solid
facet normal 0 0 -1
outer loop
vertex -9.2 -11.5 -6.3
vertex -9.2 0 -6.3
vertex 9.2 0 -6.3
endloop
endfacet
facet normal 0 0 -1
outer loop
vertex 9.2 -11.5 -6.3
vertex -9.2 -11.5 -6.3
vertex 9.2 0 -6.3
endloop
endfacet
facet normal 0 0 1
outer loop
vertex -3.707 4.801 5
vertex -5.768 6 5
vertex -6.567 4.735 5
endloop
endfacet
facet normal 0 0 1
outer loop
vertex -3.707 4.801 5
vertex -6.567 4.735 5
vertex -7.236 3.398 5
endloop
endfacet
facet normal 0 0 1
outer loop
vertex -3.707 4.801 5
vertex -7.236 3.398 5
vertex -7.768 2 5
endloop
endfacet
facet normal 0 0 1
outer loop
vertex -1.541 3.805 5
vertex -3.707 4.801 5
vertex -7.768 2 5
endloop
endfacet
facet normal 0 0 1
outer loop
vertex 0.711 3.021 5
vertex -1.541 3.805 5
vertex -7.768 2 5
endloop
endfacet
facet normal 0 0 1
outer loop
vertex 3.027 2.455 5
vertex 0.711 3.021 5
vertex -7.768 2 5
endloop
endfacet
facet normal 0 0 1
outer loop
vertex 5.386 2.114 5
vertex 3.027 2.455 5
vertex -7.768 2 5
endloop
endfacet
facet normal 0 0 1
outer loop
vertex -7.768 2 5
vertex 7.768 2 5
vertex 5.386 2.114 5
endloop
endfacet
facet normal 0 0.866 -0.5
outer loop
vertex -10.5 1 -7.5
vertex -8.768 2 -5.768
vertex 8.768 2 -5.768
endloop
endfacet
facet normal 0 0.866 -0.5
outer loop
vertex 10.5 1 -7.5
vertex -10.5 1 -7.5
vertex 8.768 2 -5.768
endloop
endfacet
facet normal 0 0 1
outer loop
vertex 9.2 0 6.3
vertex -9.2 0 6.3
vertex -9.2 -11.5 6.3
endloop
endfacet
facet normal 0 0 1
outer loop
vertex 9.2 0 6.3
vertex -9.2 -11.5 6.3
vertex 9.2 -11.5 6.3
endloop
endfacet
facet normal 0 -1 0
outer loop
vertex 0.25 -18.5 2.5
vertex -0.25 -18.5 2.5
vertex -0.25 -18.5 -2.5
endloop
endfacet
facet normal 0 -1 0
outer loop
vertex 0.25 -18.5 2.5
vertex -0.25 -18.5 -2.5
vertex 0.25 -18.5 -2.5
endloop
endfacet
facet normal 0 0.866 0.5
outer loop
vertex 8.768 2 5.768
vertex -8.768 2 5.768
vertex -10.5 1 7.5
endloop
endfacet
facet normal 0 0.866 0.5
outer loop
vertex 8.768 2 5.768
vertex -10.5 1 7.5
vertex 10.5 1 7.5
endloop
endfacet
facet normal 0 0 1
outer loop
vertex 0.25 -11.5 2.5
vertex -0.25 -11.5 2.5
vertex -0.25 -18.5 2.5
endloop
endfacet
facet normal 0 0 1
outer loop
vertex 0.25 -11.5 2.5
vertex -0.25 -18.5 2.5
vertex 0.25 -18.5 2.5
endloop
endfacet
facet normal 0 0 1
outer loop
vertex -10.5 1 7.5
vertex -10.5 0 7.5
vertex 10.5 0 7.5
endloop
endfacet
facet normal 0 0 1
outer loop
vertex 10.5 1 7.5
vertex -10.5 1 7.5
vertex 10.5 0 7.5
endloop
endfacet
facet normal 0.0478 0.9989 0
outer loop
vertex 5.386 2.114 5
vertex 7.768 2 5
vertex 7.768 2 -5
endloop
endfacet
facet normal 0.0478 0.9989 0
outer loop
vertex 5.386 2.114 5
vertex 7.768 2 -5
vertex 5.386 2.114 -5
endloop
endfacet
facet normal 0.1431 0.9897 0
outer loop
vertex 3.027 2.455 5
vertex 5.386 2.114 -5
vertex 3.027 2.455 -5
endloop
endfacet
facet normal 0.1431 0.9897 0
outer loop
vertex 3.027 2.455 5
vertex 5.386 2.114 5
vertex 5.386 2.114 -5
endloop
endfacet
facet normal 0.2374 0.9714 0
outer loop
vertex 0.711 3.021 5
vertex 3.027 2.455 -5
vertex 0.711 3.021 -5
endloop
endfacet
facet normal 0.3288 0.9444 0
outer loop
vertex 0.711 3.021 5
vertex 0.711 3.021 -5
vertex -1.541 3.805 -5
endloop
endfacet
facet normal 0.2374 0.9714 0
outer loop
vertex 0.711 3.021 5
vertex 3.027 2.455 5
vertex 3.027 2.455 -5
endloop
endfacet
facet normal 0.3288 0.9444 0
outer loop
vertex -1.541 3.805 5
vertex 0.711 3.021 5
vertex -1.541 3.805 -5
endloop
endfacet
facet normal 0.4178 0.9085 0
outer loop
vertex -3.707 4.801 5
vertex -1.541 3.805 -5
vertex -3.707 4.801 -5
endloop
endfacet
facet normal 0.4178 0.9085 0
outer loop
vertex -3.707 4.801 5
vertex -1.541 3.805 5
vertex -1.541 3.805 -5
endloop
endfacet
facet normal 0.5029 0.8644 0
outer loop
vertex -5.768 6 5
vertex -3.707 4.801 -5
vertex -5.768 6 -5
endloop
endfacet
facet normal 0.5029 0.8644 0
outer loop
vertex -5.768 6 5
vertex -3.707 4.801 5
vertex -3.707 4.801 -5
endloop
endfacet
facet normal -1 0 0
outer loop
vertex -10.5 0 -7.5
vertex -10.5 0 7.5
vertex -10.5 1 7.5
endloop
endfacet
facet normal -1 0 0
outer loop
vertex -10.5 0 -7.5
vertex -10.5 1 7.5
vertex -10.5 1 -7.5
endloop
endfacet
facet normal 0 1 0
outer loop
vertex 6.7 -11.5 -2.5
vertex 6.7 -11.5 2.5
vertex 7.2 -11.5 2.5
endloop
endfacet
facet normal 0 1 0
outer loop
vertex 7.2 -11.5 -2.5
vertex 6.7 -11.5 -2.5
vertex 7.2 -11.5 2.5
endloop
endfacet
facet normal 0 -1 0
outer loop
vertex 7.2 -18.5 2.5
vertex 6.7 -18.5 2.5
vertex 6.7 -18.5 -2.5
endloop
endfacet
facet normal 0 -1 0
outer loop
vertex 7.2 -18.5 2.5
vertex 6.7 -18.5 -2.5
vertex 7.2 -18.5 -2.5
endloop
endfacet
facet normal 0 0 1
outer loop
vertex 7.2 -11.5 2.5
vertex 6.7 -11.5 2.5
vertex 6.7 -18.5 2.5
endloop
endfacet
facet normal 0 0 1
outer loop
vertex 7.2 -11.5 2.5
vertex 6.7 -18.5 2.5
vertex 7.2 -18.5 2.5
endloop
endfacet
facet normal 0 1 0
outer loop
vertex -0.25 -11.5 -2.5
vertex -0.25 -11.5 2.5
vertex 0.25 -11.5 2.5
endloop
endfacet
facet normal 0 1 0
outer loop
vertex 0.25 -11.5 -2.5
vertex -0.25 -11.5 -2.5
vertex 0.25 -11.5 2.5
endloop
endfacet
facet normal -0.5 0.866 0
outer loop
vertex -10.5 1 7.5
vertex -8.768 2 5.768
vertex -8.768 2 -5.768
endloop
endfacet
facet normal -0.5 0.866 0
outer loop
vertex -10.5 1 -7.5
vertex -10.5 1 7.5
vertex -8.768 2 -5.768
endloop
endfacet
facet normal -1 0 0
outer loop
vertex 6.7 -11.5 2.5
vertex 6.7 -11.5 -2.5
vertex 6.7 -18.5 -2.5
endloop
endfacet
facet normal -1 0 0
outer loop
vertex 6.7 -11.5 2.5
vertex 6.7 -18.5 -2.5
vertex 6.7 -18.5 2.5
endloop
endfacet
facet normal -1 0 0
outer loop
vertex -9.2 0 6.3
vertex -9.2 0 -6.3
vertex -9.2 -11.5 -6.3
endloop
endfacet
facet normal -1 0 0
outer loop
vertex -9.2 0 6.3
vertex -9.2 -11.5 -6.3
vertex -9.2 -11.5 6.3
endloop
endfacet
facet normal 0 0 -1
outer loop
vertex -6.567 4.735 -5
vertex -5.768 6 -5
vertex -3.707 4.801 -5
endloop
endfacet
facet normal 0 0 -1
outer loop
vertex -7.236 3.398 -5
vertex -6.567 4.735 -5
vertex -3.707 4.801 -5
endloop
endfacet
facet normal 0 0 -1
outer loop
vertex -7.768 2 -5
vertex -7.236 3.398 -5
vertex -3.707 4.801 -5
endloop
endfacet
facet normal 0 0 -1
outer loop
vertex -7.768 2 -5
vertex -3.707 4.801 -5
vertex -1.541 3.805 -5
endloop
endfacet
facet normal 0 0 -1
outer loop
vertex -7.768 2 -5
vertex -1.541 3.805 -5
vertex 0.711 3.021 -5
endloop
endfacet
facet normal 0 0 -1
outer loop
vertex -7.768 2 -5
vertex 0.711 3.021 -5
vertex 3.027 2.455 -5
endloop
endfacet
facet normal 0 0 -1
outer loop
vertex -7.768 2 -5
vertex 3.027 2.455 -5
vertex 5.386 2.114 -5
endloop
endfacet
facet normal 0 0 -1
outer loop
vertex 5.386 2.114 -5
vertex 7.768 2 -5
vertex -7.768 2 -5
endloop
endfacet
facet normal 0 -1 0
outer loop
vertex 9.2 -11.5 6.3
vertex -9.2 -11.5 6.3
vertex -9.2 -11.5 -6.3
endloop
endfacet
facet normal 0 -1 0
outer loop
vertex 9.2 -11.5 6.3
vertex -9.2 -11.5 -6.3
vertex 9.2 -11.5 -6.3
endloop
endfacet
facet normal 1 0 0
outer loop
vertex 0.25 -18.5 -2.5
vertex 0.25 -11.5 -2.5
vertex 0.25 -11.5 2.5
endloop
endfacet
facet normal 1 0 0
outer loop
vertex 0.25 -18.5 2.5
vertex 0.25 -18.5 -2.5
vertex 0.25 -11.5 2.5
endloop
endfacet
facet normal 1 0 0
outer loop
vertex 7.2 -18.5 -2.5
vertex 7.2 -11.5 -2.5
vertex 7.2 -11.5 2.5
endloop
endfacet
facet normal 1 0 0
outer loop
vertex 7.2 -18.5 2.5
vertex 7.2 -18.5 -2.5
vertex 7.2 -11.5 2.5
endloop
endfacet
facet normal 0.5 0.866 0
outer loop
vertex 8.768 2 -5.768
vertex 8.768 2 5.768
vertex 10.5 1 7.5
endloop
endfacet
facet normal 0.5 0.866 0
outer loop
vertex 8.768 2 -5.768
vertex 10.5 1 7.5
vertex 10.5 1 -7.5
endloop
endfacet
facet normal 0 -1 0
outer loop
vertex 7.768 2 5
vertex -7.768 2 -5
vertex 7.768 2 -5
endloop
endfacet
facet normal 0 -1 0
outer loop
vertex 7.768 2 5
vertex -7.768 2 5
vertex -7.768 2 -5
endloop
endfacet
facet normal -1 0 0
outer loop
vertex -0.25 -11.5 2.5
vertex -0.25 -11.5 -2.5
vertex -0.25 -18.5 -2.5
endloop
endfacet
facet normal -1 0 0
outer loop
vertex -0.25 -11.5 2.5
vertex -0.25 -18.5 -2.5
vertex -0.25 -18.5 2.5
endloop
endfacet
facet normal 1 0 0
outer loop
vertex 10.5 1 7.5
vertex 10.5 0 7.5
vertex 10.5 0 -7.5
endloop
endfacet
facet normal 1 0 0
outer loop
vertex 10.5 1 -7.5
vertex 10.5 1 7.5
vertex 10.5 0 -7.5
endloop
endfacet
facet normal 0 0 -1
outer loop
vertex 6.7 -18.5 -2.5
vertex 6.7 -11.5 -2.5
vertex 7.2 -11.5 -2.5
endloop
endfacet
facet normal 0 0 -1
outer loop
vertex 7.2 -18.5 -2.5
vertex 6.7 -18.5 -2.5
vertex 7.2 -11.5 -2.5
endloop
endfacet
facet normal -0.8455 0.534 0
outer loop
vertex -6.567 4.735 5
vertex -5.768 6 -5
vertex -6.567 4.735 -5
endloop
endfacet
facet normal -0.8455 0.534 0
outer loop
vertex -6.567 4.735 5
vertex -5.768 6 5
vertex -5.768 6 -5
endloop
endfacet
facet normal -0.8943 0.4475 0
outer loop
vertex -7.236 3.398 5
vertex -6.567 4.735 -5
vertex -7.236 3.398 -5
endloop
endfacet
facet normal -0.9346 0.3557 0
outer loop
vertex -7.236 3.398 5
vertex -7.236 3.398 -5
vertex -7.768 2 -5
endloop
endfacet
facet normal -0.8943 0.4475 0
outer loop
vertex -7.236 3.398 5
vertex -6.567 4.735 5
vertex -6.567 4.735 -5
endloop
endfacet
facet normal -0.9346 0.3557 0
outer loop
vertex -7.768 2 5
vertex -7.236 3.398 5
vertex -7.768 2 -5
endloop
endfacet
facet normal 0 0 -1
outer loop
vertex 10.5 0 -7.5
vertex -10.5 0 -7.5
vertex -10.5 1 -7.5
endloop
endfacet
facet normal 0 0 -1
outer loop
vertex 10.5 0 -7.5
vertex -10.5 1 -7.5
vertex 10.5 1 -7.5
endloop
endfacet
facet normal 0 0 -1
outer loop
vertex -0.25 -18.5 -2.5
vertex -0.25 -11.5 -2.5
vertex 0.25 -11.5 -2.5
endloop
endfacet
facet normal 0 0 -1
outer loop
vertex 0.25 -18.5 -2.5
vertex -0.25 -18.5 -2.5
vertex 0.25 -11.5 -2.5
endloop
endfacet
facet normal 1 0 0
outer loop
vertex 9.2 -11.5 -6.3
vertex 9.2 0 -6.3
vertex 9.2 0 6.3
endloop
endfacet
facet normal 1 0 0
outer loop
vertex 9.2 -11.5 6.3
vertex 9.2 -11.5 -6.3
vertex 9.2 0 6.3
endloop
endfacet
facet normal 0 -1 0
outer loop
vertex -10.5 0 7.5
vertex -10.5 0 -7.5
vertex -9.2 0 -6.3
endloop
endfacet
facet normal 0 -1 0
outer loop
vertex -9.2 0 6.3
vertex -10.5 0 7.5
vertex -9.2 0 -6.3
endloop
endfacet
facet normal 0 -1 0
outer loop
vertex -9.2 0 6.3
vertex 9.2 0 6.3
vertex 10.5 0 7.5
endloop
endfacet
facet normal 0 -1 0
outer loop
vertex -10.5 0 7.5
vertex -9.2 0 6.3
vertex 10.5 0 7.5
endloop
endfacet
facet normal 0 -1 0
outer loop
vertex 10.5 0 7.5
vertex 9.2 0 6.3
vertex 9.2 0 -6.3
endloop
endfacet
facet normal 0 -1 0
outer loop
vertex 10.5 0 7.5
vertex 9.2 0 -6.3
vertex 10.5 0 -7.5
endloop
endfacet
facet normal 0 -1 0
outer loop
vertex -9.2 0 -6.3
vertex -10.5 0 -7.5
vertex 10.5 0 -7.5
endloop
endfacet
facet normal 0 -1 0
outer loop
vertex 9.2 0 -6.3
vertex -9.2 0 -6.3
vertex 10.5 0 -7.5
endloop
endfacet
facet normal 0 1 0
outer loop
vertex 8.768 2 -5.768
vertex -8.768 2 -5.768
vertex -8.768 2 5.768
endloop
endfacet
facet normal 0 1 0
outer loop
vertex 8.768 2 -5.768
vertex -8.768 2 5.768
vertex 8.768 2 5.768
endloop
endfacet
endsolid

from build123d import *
from OCP.BRepFilletAPI import BRepFilletAPI_MakeChamfer

# Parameters (mm, degrees)
SKETCH1_W             = 21
SKETCH1_H             = 15
BOSS_EXTRUDE1_DEPTH   = 2
CHAMFER1_SIZE         = 1
CHAMFER1_SIZE2        = 1.732050808
BOSS_EXTRUDE2_DEPTH   = 5
SKETCH3_W             = 18.4
SKETCH3_H             = 12.6
BOSS_EXTRUDE3_DEPTH   = 11.5
SKETCH4_W             = 0.5
SKETCH4_H             = 5
BOSS_EXTRUDE4_DEPTH   = 7
BOSS_EXTRUDE4_2_DEPTH = 7


with BuildPart() as part:
    # Sketch1 → Boss-Extrude1 (new body)
    with BuildSketch(Plane(origin=(0, 0, 0), x_dir=(1, 0, 0), z_dir=(0, 1, 0))):
        Rectangle(SKETCH1_W, SKETCH1_H)
    extrude(amount=BOSS_EXTRUDE1_DEPTH)

    # Chamfer1: one chamfer whose edges measure the first distance from different faces: ONE call of the kernel's chamfer builder (chamfer() names one face for all edges)
    chamfer1_edges_1 = [part.edges().sort_by_distance(p)[0] for p in [
        (10.5, 2, 0),
    ]]
    chamfer1_side_1 = [part.faces().sort_by_distance(p)[0] for p in [
        (10.5, 1, 0),
    ]]
    chamfer1_edges_2 = [part.edges().sort_by_distance(p)[0] for p in [
        (0, 2, -7.5),
    ]]
    chamfer1_side_2 = [part.faces().sort_by_distance(p)[0] for p in [
        (0, 1, -7.5),
    ]]
    chamfer1_edges_3 = [part.edges().sort_by_distance(p)[0] for p in [
        (-10.5, 2, 0),
    ]]
    chamfer1_side_3 = [part.faces().sort_by_distance(p)[0] for p in [
        (-10.5, 1, 0),
    ]]
    chamfer1_edges_4 = [part.edges().sort_by_distance(p)[0] for p in [
        (0, 2, 7.5),
    ]]
    chamfer1_side_4 = [part.faces().sort_by_distance(p)[0] for p in [
        (0, 1, 7.5),
    ]]
    chamfer1 = BRepFilletAPI_MakeChamfer(part.part.solid().wrapped)
    for e in chamfer1_edges_1:
        chamfer1.Add(CHAMFER1_SIZE, CHAMFER1_SIZE2, e.wrapped, chamfer1_side_1[0].wrapped)  # the first distance lies on this face
    for e in chamfer1_edges_2:
        chamfer1.Add(CHAMFER1_SIZE, CHAMFER1_SIZE2, e.wrapped, chamfer1_side_2[0].wrapped)  # the first distance lies on this face
    for e in chamfer1_edges_3:
        chamfer1.Add(CHAMFER1_SIZE, CHAMFER1_SIZE2, e.wrapped, chamfer1_side_3[0].wrapped)  # the first distance lies on this face
    for e in chamfer1_edges_4:
        chamfer1.Add(CHAMFER1_SIZE, CHAMFER1_SIZE2, e.wrapped, chamfer1_side_4[0].wrapped)  # the first distance lies on this face
    add(Compound.cast(chamfer1.Shape()), mode=Mode.REPLACE)

    # Sketch3 → Boss-Extrude3 (add)
    with BuildSketch(Plane.XZ):
        Rectangle(SKETCH3_W, SKETCH3_H)
    extrude(amount=BOSS_EXTRUDE3_DEPTH)


with BuildPart() as body_2:
    # Sketch2 → Boss-Extrude2 (new, symmetric)
    with BuildSketch(Plane.XY):
        with BuildLine():
            Line((-7.767949192, 2), (7.767949192, 2))
            ThreePointArc((7.767949192, 2), (0.710673778, 3.020927416), (-5.767949192, 6))
            ThreePointArc((-5.767949192, 6), (-6.917857896, 4.074954352), (-7.767949192, 2))
        make_face()
    extrude(amount=BOSS_EXTRUDE2_DEPTH, both=True)


with BuildPart() as body_3:
    # Sketch4 → Boss-Extrude4 (new body)
    with BuildSketch(Plane.XZ.offset(11.5)):
        Rectangle(SKETCH4_W, SKETCH4_H)
    extrude(amount=BOSS_EXTRUDE4_DEPTH)


with BuildPart() as body_4:
    # Sketch4 → Boss-Extrude4 2 (new body)
    with BuildSketch(Plane.XZ.offset(11.5)):
        with Locations((6.95, 0)):
            Rectangle(SKETCH4_W, SKETCH4_H)
    extrude(amount=BOSS_EXTRUDE4_2_DEPTH)


solid = Compound([part.part, body_2.part, body_3.part, body_4.part])
